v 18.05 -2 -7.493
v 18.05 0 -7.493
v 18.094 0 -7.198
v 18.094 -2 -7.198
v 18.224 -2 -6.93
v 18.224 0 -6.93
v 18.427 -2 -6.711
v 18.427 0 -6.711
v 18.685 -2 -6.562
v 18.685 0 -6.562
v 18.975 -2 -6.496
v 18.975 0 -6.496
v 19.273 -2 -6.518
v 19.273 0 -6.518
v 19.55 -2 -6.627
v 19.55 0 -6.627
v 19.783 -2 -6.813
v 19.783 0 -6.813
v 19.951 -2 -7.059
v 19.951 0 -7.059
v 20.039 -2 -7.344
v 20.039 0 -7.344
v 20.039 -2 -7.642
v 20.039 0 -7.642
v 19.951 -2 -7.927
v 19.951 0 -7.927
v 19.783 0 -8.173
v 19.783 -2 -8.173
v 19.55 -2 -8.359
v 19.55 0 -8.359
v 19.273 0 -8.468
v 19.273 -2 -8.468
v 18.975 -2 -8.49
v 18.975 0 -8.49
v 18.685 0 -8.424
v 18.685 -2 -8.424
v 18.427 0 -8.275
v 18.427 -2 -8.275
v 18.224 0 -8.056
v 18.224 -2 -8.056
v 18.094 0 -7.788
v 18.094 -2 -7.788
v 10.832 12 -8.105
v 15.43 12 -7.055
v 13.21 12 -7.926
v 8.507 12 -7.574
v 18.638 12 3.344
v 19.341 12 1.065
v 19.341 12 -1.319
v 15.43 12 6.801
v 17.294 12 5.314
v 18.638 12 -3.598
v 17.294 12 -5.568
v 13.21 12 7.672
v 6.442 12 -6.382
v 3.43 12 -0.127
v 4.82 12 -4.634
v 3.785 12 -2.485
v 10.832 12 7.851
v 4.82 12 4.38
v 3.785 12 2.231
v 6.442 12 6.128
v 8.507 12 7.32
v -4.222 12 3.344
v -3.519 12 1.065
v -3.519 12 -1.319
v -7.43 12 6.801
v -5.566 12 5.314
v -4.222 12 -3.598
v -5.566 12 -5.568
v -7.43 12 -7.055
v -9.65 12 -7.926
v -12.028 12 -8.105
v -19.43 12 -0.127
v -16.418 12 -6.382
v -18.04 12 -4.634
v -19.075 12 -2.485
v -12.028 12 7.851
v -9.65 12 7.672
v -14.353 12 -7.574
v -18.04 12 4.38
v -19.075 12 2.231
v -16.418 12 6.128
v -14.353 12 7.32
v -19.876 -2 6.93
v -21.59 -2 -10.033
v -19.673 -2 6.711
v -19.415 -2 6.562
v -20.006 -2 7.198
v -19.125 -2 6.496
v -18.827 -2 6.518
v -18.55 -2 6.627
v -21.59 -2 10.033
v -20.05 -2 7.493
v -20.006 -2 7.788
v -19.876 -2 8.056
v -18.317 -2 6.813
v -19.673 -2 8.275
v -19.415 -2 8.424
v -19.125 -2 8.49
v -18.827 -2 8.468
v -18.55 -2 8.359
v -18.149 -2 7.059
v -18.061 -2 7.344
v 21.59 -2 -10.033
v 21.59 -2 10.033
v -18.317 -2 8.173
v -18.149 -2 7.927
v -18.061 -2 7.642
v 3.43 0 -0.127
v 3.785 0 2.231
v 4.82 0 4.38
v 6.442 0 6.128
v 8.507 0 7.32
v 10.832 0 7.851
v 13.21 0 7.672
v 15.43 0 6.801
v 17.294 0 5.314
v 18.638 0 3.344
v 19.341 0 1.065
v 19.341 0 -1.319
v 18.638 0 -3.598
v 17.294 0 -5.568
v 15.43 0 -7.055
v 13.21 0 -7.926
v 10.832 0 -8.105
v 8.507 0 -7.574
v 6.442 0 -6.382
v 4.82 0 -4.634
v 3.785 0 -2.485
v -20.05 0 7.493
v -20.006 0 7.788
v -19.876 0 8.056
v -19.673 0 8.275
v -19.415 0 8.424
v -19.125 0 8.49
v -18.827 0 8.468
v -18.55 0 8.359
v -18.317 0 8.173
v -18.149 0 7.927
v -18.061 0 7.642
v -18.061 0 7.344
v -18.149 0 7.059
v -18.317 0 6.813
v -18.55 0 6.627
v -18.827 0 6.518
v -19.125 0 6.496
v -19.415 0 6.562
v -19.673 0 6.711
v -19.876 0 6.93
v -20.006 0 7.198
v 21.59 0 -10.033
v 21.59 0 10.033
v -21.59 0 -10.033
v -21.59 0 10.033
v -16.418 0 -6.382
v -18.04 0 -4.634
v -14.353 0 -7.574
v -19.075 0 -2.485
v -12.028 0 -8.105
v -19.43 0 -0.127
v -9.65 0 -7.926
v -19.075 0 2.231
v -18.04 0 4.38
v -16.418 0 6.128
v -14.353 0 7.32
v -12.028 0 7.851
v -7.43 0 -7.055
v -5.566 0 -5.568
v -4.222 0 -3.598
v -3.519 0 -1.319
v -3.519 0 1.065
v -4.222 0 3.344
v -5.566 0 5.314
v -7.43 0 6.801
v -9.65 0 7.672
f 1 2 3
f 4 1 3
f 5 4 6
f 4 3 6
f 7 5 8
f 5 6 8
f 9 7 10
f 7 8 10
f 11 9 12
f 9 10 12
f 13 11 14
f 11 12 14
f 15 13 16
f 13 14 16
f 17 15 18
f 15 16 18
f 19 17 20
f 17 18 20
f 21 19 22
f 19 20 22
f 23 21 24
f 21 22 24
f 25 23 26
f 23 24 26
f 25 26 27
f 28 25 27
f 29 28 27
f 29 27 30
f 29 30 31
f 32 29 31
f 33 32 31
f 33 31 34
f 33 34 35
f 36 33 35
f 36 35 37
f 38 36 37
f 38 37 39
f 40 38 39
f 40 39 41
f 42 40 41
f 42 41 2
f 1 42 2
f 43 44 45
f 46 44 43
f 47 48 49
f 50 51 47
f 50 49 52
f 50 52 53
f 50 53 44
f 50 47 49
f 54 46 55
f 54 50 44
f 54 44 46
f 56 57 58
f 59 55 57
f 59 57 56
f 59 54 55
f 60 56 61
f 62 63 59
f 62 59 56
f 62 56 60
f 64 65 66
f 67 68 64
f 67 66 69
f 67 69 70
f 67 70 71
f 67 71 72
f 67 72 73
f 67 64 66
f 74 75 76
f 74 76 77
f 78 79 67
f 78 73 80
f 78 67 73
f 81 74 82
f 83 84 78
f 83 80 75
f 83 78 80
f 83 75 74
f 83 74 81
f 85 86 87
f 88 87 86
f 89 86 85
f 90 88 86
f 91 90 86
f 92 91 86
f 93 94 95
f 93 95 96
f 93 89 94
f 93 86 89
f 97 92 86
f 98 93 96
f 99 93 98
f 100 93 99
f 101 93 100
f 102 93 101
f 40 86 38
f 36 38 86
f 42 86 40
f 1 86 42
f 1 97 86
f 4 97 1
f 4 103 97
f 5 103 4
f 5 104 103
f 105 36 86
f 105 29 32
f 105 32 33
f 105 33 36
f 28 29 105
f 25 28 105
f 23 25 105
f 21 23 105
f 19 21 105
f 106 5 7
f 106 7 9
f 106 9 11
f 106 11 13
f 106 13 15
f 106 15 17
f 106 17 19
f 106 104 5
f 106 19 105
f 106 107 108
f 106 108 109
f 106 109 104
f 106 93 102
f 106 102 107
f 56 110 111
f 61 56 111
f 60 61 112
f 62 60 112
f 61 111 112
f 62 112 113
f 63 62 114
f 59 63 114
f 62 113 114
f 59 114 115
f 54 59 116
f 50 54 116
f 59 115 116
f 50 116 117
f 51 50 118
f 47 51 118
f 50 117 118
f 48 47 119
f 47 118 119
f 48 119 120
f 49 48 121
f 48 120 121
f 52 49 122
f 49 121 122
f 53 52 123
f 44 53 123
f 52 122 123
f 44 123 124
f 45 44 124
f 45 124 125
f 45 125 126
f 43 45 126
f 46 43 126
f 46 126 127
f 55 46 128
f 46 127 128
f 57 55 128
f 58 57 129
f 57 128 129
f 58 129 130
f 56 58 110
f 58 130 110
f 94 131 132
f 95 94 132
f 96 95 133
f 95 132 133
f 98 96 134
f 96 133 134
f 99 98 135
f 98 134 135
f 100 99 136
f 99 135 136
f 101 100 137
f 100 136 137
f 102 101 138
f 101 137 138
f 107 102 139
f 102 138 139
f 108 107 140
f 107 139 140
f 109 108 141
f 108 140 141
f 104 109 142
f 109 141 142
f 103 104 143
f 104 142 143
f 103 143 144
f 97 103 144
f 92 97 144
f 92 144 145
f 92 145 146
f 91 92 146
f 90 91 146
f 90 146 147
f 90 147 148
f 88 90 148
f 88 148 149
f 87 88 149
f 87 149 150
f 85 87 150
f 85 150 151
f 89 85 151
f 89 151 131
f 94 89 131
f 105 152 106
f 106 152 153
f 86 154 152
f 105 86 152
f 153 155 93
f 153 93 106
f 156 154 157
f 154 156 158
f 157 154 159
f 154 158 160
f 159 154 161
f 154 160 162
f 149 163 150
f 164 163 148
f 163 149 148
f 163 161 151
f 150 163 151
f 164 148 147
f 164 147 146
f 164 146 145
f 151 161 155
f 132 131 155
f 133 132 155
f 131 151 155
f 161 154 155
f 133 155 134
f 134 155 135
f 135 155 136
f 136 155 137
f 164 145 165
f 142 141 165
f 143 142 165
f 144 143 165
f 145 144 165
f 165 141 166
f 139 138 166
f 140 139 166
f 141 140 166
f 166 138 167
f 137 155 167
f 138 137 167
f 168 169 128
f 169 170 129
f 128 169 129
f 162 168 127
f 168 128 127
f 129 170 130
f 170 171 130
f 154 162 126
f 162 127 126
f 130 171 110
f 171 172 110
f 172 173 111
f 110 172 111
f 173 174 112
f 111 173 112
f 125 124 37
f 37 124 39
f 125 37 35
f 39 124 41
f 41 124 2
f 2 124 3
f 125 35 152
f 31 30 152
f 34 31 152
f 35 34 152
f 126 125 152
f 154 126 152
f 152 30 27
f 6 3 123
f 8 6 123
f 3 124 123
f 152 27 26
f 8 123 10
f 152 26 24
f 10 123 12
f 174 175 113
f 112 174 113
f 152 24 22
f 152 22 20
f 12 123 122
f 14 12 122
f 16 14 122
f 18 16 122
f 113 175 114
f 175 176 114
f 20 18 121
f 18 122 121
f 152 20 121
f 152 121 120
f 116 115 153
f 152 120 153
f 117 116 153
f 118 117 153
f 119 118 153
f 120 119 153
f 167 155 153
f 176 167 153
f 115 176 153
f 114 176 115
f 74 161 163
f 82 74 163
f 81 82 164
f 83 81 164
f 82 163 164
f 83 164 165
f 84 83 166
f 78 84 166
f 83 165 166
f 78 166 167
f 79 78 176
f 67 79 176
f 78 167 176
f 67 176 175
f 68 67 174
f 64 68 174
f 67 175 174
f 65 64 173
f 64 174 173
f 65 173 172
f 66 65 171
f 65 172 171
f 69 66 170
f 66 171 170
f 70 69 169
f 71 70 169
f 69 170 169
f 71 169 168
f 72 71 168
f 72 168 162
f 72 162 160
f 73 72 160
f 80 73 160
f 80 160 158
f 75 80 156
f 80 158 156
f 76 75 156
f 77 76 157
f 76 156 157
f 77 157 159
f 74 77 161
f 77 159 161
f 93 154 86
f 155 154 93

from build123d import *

# Parameters (mm, degrees)
F0_W     = 43.18
F0_H     = 20.066
F1_DEPTH = 2
F3_D     = 2
F4_R     = 8
F5_DEPTH = 12


with BuildPart() as f1:
    # F0 (on Front) → F1 (new body)
    with BuildSketch(Plane.XZ):
        Rectangle(F0_W, F0_H)
    extrude(amount=F1_DEPTH)

    # F3 (through all)
    with Locations(Plane.XZ.offset(2)):
        with Locations((-19.05, 7.493), (19.05, -7.493)):
            Hole(F3_D / 2)

    # F4 (on face) → F5 (join)
    with BuildSketch(Plane(origin=(0, 0, 0), x_dir=(-1, 0, 0), z_dir=(0, 1, 0))):
        with Locations((11.43, -0.127)):
            Circle(F4_R)
        with Locations((-11.43, -0.127)):
            Circle(F4_R)
    extrude(amount=F5_DEPTH)


solid = f1.part
